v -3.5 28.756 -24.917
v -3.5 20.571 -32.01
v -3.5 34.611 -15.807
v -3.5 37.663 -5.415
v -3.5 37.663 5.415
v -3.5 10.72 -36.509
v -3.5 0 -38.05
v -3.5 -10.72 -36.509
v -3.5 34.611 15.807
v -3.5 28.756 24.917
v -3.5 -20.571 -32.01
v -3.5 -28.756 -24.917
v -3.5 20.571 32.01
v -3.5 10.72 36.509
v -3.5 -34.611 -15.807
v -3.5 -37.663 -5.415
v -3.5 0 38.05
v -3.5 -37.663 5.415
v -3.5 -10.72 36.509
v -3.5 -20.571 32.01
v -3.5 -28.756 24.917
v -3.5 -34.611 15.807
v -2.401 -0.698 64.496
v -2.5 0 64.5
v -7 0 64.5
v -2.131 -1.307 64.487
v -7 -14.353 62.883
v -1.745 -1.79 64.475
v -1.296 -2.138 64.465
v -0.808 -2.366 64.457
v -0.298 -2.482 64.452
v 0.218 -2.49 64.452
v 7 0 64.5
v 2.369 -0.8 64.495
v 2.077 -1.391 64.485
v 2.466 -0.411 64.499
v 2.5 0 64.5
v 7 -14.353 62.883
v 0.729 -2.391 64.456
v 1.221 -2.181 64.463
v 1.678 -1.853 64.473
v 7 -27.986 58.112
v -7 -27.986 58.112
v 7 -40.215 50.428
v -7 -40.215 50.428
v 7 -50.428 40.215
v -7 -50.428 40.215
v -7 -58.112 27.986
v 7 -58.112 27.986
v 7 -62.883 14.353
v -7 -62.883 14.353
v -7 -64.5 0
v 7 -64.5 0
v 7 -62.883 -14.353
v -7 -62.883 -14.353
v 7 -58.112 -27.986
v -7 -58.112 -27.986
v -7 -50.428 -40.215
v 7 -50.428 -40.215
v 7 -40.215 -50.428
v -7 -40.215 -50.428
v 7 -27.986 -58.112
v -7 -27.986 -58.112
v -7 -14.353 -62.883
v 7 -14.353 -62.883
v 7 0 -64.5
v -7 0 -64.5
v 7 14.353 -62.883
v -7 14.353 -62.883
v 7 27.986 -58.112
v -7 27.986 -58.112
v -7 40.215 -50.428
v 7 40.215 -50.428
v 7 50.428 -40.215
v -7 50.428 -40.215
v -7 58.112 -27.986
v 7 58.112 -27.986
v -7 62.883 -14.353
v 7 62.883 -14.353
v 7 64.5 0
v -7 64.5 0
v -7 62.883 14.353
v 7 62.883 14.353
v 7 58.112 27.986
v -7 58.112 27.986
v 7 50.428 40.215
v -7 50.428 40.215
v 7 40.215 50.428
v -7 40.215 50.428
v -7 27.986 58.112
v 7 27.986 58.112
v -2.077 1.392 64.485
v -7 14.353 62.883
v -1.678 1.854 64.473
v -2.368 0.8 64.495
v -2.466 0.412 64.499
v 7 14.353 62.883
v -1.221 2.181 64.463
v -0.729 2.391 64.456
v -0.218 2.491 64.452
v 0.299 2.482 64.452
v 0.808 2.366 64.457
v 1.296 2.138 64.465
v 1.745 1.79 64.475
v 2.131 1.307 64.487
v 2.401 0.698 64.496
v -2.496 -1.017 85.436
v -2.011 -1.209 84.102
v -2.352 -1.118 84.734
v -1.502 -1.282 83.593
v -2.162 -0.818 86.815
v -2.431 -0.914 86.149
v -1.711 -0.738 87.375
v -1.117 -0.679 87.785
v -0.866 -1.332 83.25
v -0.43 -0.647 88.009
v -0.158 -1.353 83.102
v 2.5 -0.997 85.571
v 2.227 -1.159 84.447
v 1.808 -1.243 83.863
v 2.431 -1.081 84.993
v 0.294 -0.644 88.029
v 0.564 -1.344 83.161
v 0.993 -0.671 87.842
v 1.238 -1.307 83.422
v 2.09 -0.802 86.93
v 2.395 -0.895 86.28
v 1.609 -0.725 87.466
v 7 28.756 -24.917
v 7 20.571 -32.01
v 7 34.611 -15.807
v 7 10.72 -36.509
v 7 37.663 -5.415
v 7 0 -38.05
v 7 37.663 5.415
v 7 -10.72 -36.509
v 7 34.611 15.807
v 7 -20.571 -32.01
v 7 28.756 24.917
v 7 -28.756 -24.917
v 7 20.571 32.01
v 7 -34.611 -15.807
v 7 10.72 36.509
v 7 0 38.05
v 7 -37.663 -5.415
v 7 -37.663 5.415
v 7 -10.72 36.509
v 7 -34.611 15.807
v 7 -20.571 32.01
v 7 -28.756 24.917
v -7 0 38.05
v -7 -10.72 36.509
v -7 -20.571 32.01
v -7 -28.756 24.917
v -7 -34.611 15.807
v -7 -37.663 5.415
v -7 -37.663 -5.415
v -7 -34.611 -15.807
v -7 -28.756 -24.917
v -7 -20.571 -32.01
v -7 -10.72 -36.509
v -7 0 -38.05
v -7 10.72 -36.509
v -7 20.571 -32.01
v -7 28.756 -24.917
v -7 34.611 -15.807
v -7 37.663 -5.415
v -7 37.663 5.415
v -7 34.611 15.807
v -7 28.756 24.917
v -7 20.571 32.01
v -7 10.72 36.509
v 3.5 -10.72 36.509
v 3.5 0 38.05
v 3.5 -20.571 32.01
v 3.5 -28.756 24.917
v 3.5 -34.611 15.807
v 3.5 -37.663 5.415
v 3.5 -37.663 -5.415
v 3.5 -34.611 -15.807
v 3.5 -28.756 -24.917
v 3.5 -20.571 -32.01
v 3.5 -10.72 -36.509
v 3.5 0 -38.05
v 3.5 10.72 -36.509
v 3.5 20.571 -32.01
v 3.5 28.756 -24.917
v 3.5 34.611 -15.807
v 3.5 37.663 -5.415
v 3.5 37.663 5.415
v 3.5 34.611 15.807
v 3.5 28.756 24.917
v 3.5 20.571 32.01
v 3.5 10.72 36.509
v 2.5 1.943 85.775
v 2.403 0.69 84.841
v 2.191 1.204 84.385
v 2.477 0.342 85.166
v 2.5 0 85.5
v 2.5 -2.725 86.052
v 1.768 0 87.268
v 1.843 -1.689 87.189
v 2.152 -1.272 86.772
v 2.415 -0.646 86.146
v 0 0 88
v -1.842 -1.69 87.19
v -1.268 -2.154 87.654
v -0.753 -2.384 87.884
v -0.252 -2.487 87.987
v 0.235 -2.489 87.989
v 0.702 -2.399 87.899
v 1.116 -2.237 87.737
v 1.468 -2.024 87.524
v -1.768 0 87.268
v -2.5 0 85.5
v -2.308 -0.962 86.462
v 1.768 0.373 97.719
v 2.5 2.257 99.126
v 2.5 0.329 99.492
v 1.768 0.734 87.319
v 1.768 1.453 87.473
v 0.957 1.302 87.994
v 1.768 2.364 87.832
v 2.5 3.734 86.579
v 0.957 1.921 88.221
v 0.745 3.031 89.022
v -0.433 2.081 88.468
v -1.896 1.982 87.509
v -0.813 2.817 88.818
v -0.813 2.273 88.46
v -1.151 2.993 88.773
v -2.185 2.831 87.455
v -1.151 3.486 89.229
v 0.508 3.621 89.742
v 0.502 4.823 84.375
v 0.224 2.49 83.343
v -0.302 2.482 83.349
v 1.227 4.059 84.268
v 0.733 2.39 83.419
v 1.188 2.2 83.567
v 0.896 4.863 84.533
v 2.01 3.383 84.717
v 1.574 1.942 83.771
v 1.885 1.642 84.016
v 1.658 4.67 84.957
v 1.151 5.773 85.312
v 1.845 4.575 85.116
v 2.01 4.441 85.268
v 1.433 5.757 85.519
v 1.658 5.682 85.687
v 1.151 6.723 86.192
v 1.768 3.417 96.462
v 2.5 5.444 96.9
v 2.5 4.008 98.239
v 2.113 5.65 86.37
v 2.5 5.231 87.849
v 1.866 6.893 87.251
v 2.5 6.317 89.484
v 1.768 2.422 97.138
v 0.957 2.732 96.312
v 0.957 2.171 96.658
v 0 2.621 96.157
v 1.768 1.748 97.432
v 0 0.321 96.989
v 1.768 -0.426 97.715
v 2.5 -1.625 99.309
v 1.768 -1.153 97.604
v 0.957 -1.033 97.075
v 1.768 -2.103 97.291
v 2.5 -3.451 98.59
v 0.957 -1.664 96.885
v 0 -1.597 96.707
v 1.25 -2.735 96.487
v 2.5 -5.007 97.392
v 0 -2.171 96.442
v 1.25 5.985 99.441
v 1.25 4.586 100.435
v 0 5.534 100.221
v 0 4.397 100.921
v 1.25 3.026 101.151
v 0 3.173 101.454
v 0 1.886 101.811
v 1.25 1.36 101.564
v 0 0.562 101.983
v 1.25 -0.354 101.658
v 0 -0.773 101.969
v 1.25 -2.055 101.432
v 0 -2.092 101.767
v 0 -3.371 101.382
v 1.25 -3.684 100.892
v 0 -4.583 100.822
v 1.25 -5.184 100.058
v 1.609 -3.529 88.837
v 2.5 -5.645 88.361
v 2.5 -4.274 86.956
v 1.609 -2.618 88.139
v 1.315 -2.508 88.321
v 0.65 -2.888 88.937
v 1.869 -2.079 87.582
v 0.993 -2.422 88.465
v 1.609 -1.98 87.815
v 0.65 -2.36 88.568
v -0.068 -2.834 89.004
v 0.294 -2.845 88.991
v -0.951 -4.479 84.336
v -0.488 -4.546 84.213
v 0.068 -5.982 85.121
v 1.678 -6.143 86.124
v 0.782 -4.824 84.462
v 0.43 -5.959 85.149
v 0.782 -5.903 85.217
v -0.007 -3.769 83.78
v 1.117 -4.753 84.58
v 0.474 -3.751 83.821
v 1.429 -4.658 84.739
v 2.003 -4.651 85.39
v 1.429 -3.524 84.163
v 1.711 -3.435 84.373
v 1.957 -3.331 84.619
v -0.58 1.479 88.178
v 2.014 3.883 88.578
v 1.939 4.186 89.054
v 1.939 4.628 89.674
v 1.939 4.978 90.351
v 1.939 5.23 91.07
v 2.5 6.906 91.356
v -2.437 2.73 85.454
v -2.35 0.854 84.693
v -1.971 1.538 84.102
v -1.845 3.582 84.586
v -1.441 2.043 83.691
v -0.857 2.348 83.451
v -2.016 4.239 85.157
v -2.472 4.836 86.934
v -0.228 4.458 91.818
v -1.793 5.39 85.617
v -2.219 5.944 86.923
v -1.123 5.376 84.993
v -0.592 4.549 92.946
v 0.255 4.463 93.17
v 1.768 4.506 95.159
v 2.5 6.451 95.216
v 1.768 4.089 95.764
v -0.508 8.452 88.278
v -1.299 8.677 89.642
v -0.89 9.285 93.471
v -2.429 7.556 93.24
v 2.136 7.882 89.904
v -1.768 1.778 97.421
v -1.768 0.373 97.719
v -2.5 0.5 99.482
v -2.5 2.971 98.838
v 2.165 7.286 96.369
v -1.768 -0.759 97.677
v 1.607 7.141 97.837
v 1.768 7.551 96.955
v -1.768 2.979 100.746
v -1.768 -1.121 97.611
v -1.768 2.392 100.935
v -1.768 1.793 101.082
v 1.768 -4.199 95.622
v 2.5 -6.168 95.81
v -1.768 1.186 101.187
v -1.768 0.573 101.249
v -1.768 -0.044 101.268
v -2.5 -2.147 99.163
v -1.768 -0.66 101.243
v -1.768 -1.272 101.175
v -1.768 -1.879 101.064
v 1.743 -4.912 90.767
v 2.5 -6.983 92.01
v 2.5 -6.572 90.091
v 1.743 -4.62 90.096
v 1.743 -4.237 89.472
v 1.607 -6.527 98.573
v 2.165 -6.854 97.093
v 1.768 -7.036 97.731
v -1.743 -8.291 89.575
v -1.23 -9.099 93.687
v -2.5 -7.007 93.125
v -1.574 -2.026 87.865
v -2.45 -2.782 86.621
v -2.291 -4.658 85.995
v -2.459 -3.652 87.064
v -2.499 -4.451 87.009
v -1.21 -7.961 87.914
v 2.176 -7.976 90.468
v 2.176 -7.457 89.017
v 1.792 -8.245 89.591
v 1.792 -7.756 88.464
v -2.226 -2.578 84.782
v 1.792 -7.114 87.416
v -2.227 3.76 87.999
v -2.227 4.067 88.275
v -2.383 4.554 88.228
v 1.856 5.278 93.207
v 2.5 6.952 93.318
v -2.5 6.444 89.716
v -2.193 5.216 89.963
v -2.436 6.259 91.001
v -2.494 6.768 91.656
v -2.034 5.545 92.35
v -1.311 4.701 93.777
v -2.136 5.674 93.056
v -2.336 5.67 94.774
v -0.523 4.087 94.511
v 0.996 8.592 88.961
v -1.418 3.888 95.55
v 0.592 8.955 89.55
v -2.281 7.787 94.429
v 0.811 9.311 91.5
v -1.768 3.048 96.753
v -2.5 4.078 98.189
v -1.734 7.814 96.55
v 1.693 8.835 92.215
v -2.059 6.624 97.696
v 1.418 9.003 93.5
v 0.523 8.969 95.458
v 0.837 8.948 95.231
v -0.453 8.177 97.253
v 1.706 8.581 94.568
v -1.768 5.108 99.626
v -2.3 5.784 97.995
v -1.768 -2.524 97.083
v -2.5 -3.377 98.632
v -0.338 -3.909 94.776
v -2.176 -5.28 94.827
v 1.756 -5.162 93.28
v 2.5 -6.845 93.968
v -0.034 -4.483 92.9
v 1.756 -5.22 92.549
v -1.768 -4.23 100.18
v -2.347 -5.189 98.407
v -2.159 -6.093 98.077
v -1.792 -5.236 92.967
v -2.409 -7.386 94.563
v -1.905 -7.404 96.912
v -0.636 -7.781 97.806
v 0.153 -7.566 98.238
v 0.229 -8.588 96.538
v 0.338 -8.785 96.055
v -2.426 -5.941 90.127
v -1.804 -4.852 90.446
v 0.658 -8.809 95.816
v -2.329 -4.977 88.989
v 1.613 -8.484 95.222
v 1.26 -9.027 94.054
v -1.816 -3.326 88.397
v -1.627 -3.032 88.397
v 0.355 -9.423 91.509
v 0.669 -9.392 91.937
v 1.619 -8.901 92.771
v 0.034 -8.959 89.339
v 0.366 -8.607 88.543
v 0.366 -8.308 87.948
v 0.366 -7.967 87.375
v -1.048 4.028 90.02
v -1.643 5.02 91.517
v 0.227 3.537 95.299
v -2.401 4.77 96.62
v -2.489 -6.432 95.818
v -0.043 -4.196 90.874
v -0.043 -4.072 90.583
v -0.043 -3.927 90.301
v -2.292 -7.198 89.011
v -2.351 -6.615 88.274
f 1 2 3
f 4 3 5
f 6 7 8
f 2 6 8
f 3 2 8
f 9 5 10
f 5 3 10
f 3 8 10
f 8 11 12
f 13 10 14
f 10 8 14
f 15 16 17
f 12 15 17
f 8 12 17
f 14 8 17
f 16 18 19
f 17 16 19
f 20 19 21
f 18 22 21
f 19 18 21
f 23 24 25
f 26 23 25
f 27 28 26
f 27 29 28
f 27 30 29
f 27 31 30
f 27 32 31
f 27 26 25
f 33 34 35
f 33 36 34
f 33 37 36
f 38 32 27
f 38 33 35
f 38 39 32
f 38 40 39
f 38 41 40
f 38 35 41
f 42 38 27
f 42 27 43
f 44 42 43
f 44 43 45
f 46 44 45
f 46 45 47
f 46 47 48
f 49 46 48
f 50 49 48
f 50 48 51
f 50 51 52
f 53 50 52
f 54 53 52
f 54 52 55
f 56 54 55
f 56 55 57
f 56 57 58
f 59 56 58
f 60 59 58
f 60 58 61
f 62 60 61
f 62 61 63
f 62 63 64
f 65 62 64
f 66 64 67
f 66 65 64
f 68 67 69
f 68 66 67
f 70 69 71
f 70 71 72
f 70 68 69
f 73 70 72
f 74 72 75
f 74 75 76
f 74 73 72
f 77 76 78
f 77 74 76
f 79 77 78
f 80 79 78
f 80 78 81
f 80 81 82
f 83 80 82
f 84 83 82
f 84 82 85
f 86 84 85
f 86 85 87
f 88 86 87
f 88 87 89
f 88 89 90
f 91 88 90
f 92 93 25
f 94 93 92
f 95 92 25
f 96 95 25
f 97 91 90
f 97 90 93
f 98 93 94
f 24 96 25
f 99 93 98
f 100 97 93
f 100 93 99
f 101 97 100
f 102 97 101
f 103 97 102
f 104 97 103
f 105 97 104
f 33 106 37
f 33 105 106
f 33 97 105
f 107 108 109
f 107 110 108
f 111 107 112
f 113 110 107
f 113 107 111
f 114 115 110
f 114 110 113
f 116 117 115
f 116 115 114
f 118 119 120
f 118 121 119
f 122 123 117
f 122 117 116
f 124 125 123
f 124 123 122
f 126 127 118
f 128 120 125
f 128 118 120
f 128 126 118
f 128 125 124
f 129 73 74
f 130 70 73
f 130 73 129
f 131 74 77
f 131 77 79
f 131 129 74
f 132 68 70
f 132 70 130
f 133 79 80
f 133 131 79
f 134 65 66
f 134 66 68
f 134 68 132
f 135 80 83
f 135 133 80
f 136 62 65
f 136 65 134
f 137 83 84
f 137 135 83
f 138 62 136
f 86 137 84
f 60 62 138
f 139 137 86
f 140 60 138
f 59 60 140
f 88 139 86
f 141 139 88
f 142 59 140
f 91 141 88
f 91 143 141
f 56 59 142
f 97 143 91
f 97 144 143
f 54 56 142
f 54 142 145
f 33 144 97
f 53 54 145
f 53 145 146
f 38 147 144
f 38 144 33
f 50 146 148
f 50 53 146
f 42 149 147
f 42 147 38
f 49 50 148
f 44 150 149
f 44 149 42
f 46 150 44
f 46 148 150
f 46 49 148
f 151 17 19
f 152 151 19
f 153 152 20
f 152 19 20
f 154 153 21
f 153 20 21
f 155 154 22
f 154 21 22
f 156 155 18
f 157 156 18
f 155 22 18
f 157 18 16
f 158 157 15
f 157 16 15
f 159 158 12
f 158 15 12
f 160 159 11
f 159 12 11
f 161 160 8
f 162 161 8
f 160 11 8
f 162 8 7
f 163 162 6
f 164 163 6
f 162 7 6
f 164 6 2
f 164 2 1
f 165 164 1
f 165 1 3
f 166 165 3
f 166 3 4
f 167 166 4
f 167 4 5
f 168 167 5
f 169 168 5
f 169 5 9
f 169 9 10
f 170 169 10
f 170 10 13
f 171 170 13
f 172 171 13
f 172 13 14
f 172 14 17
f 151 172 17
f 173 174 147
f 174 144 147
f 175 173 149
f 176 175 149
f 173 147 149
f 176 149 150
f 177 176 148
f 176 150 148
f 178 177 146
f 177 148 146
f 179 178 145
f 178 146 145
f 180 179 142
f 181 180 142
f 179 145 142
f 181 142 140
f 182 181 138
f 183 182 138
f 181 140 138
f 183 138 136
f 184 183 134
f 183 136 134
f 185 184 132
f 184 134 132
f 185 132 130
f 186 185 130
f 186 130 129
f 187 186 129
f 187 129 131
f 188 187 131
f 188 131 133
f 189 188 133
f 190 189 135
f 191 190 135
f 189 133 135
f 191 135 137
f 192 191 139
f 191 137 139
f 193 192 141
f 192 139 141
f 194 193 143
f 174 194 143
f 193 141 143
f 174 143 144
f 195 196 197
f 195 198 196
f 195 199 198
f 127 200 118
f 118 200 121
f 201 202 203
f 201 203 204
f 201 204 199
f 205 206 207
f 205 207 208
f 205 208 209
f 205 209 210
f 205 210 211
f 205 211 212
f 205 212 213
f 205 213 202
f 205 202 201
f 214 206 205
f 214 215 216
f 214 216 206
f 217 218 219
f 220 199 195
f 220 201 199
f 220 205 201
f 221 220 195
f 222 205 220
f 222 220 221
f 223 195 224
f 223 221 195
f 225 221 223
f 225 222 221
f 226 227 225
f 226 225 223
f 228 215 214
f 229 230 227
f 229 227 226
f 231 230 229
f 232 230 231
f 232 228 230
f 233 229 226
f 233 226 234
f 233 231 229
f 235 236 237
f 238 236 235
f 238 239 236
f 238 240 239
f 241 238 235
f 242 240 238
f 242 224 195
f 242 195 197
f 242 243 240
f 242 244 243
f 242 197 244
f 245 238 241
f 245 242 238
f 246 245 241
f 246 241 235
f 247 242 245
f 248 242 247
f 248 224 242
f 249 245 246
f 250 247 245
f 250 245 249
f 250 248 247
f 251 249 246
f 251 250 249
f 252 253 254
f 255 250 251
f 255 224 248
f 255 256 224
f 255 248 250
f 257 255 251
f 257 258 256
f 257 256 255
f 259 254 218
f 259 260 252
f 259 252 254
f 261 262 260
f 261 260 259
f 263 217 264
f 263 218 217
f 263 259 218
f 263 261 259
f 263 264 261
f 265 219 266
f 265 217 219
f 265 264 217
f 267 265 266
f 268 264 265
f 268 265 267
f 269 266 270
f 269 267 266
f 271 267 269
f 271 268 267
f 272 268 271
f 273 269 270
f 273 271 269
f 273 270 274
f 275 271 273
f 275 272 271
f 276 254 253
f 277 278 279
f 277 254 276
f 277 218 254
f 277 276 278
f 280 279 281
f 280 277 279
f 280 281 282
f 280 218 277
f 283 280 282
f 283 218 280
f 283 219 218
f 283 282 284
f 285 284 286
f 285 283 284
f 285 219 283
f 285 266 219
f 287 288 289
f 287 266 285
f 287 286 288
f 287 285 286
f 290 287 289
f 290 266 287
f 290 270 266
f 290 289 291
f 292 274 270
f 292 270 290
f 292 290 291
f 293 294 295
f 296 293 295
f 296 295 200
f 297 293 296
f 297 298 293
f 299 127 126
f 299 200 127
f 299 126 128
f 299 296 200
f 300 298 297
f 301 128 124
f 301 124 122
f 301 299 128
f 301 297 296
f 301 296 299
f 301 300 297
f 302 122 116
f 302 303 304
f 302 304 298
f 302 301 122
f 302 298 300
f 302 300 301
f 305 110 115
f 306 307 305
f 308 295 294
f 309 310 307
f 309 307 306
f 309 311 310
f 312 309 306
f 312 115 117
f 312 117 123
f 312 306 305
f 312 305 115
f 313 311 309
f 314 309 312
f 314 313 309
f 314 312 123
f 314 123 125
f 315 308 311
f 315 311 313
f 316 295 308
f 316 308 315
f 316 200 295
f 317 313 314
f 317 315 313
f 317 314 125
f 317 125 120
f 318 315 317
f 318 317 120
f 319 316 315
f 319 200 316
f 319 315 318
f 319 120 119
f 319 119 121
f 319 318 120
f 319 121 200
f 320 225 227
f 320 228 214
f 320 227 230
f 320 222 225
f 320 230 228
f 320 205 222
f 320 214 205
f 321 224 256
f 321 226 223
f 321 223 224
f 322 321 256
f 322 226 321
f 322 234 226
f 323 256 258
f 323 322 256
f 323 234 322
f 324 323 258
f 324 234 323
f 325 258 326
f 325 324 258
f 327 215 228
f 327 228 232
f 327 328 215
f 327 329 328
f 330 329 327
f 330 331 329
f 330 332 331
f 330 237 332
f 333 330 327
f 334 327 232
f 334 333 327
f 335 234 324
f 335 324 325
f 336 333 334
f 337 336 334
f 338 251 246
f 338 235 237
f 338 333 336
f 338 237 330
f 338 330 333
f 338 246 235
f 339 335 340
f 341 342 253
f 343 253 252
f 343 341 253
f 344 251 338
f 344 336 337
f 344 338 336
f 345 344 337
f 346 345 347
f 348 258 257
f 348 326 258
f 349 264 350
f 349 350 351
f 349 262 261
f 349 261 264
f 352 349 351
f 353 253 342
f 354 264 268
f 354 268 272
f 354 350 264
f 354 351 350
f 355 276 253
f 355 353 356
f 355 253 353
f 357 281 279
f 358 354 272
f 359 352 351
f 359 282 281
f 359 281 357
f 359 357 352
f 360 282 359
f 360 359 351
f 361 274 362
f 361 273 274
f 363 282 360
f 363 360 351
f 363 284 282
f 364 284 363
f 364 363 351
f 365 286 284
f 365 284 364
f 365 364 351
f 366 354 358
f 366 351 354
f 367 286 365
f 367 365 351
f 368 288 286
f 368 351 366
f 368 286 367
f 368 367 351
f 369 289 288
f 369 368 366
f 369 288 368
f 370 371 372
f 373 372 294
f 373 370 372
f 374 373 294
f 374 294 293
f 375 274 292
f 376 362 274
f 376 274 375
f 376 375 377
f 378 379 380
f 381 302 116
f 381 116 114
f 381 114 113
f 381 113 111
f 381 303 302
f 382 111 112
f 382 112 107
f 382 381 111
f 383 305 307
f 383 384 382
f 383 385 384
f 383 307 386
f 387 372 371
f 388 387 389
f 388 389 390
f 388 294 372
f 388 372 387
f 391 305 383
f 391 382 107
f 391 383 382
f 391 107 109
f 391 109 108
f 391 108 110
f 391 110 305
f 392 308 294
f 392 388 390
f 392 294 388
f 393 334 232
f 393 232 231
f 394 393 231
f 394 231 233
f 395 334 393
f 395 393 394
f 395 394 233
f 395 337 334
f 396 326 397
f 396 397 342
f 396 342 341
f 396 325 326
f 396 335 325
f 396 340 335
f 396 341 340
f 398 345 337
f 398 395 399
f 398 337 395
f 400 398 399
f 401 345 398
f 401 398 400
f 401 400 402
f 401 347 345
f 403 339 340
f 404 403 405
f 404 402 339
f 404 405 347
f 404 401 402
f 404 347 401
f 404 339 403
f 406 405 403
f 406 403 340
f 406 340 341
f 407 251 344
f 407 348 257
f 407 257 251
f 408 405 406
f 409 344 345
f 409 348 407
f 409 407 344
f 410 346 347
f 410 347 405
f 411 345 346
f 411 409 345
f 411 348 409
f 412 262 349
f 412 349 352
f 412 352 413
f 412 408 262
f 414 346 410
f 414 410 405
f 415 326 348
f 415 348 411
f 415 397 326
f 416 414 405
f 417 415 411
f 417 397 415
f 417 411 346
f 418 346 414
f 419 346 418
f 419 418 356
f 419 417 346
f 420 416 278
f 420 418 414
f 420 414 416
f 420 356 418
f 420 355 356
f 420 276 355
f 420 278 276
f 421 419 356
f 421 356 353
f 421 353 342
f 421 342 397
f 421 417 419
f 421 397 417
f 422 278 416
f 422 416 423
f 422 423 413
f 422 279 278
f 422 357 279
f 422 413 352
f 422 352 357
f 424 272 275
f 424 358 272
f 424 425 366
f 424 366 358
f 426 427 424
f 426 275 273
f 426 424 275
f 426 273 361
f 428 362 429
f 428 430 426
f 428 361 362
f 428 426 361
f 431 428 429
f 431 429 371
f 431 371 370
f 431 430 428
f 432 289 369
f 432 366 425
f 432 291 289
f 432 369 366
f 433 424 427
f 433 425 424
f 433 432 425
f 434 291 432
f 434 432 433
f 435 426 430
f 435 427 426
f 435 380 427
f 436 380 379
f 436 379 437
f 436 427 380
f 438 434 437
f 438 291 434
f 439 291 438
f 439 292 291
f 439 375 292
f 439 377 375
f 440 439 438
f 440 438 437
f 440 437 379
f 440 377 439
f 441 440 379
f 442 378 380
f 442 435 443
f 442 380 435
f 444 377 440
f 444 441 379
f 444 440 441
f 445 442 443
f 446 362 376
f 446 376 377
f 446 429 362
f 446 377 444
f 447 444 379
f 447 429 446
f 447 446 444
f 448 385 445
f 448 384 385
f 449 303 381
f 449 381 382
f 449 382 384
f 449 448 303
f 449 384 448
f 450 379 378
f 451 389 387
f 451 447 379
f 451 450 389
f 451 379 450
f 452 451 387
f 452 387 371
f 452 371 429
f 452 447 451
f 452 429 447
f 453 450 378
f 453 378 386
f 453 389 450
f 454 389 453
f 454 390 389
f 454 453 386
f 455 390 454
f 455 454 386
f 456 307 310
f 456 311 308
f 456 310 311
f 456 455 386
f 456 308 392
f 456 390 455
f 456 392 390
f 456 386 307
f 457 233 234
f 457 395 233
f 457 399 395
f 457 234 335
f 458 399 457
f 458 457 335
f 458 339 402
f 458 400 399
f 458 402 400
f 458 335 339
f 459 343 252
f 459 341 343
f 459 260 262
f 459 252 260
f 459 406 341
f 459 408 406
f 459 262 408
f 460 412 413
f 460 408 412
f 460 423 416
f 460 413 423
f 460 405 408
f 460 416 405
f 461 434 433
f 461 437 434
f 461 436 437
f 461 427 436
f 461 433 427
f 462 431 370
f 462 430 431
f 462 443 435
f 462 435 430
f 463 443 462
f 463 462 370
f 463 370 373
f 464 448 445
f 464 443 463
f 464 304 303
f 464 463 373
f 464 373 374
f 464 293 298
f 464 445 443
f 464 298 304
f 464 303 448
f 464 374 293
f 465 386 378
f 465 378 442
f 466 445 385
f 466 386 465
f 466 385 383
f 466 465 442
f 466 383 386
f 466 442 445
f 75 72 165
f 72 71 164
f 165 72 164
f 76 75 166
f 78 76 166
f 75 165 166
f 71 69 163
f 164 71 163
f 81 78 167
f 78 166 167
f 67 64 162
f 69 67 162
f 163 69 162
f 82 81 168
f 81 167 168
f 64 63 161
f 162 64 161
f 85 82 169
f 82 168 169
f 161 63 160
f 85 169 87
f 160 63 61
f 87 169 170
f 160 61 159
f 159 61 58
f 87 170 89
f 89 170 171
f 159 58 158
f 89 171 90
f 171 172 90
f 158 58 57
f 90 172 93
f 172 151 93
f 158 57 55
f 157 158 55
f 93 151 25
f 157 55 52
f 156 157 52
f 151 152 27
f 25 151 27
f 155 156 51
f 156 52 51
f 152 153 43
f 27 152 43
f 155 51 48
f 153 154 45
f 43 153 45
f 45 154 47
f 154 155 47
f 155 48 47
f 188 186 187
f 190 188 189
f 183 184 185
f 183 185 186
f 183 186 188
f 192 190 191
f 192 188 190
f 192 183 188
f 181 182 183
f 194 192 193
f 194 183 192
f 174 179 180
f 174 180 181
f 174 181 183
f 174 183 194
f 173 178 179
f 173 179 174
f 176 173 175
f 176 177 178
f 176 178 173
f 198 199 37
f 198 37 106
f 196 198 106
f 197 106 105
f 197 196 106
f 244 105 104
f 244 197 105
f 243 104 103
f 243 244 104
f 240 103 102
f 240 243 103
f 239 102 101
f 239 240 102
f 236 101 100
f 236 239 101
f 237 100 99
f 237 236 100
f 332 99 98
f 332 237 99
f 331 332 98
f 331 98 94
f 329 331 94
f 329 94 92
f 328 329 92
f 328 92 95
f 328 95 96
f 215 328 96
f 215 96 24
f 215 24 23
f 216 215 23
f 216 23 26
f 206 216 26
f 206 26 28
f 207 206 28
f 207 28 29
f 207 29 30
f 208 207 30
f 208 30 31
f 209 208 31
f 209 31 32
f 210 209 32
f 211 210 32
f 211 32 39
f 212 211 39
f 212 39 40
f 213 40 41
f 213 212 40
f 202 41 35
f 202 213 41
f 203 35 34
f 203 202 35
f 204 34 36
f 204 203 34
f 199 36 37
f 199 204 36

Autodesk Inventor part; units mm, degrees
ref_plane "YZ Plane" through (0, 0, 0) normal (1, 0, 0) x (0, 1, 0)
ref_plane "XZ Plane" through (0, 0, 0) normal (0, 1, 0) x (-1, 0, 0)
ref_plane "XY Plane" through (0, 0, 0) normal (0, 0, 1) x (1, 0, 0)
sketch "Sketch1" plane through (0, 0, 0) normal (0, 1, 0) x (-1, 0, 0)
  line L0 (7, 0) -> (-7, 0) construction
  line L1 (7, 64.5) -> (-7, 64.5)
  line L2 (-7, 64.5) -> (-7, 38.05)
  line L3 (7, 38.05) -> (-7, 38.05)
  line L4 (7, 38.05) -> (7, 64.5)
  line L5 (3.5, 0) -> (-3.5, 0)
  line L6 (-3.5, 0) -> (-3.5, 38.05)
  line L7 (-3.5, 38.05) -> (3.5, 38.05)
  line L8 (3.5, 38.05) -> (3.5, 0)
  line L9 (3.5, 0) -> (-3.5, 38.05) construction
  line L10 (-3.5, 0) -> (3.5, 38.05) construction
  point P0 (0, 19.025)
  point P1 (0, 38.05)
  point P2 (0, 0)
  point P3 (0, 0)
  dimension "Thickness" = 14
  dimension "DiamExt" = 129
  dimension "PipeDiameter" = 76.1
  dimension "d8" = 7
revolve "Revolution1" add sketch "Sketch1" angle 360 about axis through (-7, 0, 0) along (1, 0, 0)
sketch "Sketch3" plane through (0, 0, 0) normal (0, 0, 1) x (1, 0, 0)
  circle A0 centre (0, 0) radius 2.5
  dimension "d9" = 5
sketch "Sketch4" plane through (0, 0, 0) normal (1, 0, 0) x (0, 1, 0)
  line L0 (0, 0) -> (0, 85.5)
  arc A0 (0, 85.5) -> (-0.9974, 85.5714) centre (0, 92.5) ccw
  dimension "d10" = 7
  dimension "d11" = 92.5
  dimension "d14" = 1
sweep "Sweep1" add profiles "Sketch3" path "Sketch4"
equation "\"d8\" = 0.5 * Thickness"
equation "\"d10\" = 0.5 * Thickness"
equation "\"d11\" = 0.5 * DiamExt + 2 * Thickness"
properties part number "CHECK VALVE SWING WAFER 304L DN65" material "304L"
